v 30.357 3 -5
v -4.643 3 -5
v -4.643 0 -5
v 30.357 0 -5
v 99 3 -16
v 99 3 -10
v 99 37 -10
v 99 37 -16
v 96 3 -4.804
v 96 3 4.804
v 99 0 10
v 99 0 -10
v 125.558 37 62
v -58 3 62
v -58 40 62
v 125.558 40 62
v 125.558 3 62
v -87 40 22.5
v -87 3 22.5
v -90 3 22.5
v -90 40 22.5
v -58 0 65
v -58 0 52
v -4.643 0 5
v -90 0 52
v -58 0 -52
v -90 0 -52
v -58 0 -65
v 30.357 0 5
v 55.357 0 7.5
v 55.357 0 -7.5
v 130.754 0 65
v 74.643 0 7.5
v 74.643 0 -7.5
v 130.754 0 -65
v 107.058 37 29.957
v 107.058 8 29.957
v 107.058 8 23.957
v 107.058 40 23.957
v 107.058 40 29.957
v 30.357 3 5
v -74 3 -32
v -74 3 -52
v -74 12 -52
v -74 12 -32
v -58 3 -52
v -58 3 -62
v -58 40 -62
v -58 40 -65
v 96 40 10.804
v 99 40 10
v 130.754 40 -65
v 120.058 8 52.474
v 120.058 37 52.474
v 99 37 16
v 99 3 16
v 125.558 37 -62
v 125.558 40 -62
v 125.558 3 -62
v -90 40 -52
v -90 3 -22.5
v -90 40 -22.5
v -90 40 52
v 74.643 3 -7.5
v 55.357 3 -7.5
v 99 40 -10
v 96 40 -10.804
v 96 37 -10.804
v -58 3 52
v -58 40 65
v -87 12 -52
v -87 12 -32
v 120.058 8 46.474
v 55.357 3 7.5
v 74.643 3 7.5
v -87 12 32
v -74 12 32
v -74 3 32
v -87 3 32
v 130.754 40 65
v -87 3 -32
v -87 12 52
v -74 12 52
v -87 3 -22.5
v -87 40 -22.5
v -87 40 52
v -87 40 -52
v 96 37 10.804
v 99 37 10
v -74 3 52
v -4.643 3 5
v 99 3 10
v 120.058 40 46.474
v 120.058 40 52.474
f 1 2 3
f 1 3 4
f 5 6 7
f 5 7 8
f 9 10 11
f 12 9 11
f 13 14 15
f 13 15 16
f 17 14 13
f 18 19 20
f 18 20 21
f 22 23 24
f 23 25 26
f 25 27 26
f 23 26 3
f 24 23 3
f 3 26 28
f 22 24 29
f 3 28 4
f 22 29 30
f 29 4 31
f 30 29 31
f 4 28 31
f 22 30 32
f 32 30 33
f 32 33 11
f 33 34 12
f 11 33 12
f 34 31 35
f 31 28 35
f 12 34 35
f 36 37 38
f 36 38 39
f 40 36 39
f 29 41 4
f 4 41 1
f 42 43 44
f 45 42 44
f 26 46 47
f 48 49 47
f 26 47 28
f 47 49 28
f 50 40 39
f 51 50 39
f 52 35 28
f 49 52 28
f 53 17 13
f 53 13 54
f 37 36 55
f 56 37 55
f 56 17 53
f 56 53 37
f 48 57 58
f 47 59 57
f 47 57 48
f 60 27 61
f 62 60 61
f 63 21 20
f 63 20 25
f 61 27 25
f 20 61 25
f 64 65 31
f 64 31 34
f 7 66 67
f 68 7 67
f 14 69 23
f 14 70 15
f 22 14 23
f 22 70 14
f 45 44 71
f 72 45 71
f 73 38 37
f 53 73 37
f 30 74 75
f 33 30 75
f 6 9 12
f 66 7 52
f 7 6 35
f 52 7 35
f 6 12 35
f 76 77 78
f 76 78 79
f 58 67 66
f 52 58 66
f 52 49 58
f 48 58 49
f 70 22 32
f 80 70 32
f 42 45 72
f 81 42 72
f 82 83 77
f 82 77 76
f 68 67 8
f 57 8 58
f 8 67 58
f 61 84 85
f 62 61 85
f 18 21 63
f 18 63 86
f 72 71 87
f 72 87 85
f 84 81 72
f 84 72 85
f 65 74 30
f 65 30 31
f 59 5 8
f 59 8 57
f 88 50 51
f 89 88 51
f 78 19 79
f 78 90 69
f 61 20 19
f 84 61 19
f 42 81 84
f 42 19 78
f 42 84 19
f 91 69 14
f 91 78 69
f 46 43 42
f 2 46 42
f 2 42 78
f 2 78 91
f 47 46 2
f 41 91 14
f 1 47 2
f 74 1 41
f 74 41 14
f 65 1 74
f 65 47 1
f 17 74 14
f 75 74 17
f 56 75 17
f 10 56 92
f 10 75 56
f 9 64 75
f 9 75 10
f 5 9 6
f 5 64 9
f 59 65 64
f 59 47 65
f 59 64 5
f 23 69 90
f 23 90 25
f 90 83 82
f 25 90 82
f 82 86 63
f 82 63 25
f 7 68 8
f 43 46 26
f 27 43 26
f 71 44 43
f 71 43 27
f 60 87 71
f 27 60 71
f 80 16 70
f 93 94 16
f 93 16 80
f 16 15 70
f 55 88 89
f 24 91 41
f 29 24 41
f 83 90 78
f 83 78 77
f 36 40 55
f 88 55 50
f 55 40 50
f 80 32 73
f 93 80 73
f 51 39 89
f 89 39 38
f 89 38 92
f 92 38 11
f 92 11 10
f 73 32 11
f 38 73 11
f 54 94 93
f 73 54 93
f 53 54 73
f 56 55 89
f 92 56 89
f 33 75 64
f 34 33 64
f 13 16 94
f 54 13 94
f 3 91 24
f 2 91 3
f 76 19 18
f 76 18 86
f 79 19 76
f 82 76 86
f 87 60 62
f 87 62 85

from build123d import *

# Parameters (mm, degrees)
BOSS_EXTRUDE1_DEPTH = 40
SHELL5_START        = 3
SHELL5_DEPTH        = 34
CHAMFER1_SIZE       = 3
CUT_EXTRUDE1_DEPTH  = 3
SKETCH7_W           = 13
SKETCH7_H           = 9
CUT_EXTRUDE3_DEPTH  = 10
SKETCH7_4_W         = 13
SKETCH7_4_H         = 9
BOSS_EXTRUDE7_DEPTH = 30
CUT_EXTRUDE8_DEPTH  = 55
SKETCH7_6_W         = 13
SKETCH7_6_H         = 9
CUT_EXTRUDE10_DEPTH = 10
SKETCH8_W           = 45
SKETCH8_H           = 40
CUT_EXTRUDE4_DEPTH  = 30
SKETCH9_W           = 19.285714286
SKETCH9_H           = 15
SKETCH9_W_2         = 35
SKETCH9_H_2         = 10
CUT_EXTRUDE5_DEPTH  = 30


# Read off the part's stored shape, not the designer's step: Shell5
with BuildPart() as part:
    # Sketch1 → Boss-Extrude1 (new body)
    with BuildSketch(Plane(origin=(0, 0, 0), x_dir=(1, 0, 0), z_dir=(0, 1, 0))):
        Polygon((-90, -65), (130.754264805, -65), (99, -10), (99, 10), (130.754264805, 65), (-90, 65), align=None)
    extrude(amount=BOSS_EXTRUDE1_DEPTH)

    # Shell5 outline → Shell5 (cut)
    with BuildSketch(Plane(origin=(0, 0, 0), x_dir=(1, 0, 0), z_dir=(0, 1, 0)).offset(SHELL5_START)):
        Polygon((99, -16), (99, 16), (125.558112383, 62), (-87, 62), (-87, -62), (125.558112383, -62), align=None)
    extrude(amount=SHELL5_DEPTH, mode=Mode.SUBTRACT)

    # Chamfer1
    chamfer1_edges = [part.edges().sort_by_distance(p)[0] for p in [
        (99, 3, 0),
    ]]
    chamfer(chamfer1_edges, length=CHAMFER1_SIZE - 0.0001)  # a hair under: the kernel refuses the full size

    # Sketch6 → Cut-Extrude1 (cut)
    with BuildSketch(Plane(origin=(0, 40, 0), x_dir=(1, 0, 0), z_dir=(0, 1, 0))):
        Polygon((125.558112383, 62), (-87, 62), (-87, -62), (125.558112383, -62), (96, -10.803847577), (96, 10.803847577), align=None)
        Polygon((99, 10), (96, 10.803847577), (96, -10.803847577), (99, -10), align=None)
    extrude(amount=-CUT_EXTRUDE1_DEPTH, mode=Mode.SUBTRACT)

    # Sketch7 → Cut-Extrude3 (cut)
    with BuildSketch(Plane(origin=(0, 0, 62), x_dir=(-1, 0, 0), z_dir=(0, 0, -1))):
        Polygon((58, 3), (58, -4.5), (103, -4.5), (103, 40.5), (58, 40.5), (58, 40), (87, 40), (87, 12), (87, 3), (74, 3), align=None)
        Polygon((58, 40), (58, 3), (74, 3), (74, 12), (87, 12), (87, 40), align=None)
        with Locations((80.5, 7.5)):
            Rectangle(SKETCH7_W, SKETCH7_H)
    cut_extrude3 = extrude(amount=-CUT_EXTRUDE3_DEPTH, mode=Mode.SUBTRACT)

    # Sketch7<4> → Boss-Extrude7 (add)
    with BuildSketch(Plane(origin=(0, 0, 62), x_dir=(-1, 0, 0), z_dir=(0, 0, -1))):
        with Locations((80.5, 7.5)):
            Rectangle(SKETCH7_4_W, SKETCH7_4_H)
    boss_extrude7 = extrude(amount=BOSS_EXTRUDE7_DEPTH)

    # Sketch12 → Cut-Extrude8 (cut)
    with BuildSketch(Plane(origin=(0, 0, 62), x_dir=(-1, 0, 0), z_dir=(0, 0, -1))):
        Polygon((-107.058112383, 43), (-107.058112383, 8), (-120.058112383, 43), align=None)
        Polygon((-120.058112383, 43), (-120.058112383, 8), (-107.058112383, 8), align=None)
        Polygon((-107.058112383, 40), (-118.943826668, 40), (-107.058112383, 8), align=None)
    extrude(amount=CUT_EXTRUDE8_DEPTH, mode=Mode.SUBTRACT)

    # Sketch7<6> → Cut-Extrude10 (cut)
    with BuildSketch(Plane(origin=(0, 0, 62), x_dir=(-1, 0, 0), z_dir=(0, 0, -1))):
        Polygon((58, 3), (58, -4.5), (103, -4.5), (103, 40.5), (58, 40.5), (58, 40), (87, 40), (87, 12), (87, 3), (74, 3), align=None)
        with Locations((80.5, 7.5)):
            Rectangle(SKETCH7_6_W, SKETCH7_6_H)
        Polygon((58, 40), (58, 3), (74, 3), (74, 12), (87, 12), (87, 40), align=None)
    cut_extrude10 = extrude(amount=CUT_EXTRUDE10_DEPTH, mode=Mode.SUBTRACT)

    # Mirror6: Cut-Extrude3, Boss-Extrude7, Cut-Extrude10 across plane
    add(cut_extrude3.mirror(Plane.XY), mode=Mode.SUBTRACT)
    add(boss_extrude7.mirror(Plane.XY))
    add(cut_extrude10.mirror(Plane.XY), mode=Mode.SUBTRACT)

    # Sketch8 → Cut-Extrude4 (cut)
    with BuildSketch(Plane(origin=(-87, 0, 0), x_dir=(0, 0, -1), z_dir=(1, 0, 0))):
        with Locations((0, 23)):
            Rectangle(SKETCH8_W, SKETCH8_H)
    extrude(amount=-CUT_EXTRUDE4_DEPTH, mode=Mode.SUBTRACT)

    # Sketch9 → Cut-Extrude5 (cut)
    with BuildSketch(Plane(origin=(0, 3, 0), x_dir=(1, 0, 0), z_dir=(0, 1, 0))):
        with Locations((65, 0)):
            Rectangle(SKETCH9_W, SKETCH9_H)
        with Locations((12.857142857, 0)):
            Rectangle(SKETCH9_W_2, SKETCH9_H_2)
    extrude(amount=-CUT_EXTRUDE5_DEPTH, mode=Mode.SUBTRACT)


solid = part.part
